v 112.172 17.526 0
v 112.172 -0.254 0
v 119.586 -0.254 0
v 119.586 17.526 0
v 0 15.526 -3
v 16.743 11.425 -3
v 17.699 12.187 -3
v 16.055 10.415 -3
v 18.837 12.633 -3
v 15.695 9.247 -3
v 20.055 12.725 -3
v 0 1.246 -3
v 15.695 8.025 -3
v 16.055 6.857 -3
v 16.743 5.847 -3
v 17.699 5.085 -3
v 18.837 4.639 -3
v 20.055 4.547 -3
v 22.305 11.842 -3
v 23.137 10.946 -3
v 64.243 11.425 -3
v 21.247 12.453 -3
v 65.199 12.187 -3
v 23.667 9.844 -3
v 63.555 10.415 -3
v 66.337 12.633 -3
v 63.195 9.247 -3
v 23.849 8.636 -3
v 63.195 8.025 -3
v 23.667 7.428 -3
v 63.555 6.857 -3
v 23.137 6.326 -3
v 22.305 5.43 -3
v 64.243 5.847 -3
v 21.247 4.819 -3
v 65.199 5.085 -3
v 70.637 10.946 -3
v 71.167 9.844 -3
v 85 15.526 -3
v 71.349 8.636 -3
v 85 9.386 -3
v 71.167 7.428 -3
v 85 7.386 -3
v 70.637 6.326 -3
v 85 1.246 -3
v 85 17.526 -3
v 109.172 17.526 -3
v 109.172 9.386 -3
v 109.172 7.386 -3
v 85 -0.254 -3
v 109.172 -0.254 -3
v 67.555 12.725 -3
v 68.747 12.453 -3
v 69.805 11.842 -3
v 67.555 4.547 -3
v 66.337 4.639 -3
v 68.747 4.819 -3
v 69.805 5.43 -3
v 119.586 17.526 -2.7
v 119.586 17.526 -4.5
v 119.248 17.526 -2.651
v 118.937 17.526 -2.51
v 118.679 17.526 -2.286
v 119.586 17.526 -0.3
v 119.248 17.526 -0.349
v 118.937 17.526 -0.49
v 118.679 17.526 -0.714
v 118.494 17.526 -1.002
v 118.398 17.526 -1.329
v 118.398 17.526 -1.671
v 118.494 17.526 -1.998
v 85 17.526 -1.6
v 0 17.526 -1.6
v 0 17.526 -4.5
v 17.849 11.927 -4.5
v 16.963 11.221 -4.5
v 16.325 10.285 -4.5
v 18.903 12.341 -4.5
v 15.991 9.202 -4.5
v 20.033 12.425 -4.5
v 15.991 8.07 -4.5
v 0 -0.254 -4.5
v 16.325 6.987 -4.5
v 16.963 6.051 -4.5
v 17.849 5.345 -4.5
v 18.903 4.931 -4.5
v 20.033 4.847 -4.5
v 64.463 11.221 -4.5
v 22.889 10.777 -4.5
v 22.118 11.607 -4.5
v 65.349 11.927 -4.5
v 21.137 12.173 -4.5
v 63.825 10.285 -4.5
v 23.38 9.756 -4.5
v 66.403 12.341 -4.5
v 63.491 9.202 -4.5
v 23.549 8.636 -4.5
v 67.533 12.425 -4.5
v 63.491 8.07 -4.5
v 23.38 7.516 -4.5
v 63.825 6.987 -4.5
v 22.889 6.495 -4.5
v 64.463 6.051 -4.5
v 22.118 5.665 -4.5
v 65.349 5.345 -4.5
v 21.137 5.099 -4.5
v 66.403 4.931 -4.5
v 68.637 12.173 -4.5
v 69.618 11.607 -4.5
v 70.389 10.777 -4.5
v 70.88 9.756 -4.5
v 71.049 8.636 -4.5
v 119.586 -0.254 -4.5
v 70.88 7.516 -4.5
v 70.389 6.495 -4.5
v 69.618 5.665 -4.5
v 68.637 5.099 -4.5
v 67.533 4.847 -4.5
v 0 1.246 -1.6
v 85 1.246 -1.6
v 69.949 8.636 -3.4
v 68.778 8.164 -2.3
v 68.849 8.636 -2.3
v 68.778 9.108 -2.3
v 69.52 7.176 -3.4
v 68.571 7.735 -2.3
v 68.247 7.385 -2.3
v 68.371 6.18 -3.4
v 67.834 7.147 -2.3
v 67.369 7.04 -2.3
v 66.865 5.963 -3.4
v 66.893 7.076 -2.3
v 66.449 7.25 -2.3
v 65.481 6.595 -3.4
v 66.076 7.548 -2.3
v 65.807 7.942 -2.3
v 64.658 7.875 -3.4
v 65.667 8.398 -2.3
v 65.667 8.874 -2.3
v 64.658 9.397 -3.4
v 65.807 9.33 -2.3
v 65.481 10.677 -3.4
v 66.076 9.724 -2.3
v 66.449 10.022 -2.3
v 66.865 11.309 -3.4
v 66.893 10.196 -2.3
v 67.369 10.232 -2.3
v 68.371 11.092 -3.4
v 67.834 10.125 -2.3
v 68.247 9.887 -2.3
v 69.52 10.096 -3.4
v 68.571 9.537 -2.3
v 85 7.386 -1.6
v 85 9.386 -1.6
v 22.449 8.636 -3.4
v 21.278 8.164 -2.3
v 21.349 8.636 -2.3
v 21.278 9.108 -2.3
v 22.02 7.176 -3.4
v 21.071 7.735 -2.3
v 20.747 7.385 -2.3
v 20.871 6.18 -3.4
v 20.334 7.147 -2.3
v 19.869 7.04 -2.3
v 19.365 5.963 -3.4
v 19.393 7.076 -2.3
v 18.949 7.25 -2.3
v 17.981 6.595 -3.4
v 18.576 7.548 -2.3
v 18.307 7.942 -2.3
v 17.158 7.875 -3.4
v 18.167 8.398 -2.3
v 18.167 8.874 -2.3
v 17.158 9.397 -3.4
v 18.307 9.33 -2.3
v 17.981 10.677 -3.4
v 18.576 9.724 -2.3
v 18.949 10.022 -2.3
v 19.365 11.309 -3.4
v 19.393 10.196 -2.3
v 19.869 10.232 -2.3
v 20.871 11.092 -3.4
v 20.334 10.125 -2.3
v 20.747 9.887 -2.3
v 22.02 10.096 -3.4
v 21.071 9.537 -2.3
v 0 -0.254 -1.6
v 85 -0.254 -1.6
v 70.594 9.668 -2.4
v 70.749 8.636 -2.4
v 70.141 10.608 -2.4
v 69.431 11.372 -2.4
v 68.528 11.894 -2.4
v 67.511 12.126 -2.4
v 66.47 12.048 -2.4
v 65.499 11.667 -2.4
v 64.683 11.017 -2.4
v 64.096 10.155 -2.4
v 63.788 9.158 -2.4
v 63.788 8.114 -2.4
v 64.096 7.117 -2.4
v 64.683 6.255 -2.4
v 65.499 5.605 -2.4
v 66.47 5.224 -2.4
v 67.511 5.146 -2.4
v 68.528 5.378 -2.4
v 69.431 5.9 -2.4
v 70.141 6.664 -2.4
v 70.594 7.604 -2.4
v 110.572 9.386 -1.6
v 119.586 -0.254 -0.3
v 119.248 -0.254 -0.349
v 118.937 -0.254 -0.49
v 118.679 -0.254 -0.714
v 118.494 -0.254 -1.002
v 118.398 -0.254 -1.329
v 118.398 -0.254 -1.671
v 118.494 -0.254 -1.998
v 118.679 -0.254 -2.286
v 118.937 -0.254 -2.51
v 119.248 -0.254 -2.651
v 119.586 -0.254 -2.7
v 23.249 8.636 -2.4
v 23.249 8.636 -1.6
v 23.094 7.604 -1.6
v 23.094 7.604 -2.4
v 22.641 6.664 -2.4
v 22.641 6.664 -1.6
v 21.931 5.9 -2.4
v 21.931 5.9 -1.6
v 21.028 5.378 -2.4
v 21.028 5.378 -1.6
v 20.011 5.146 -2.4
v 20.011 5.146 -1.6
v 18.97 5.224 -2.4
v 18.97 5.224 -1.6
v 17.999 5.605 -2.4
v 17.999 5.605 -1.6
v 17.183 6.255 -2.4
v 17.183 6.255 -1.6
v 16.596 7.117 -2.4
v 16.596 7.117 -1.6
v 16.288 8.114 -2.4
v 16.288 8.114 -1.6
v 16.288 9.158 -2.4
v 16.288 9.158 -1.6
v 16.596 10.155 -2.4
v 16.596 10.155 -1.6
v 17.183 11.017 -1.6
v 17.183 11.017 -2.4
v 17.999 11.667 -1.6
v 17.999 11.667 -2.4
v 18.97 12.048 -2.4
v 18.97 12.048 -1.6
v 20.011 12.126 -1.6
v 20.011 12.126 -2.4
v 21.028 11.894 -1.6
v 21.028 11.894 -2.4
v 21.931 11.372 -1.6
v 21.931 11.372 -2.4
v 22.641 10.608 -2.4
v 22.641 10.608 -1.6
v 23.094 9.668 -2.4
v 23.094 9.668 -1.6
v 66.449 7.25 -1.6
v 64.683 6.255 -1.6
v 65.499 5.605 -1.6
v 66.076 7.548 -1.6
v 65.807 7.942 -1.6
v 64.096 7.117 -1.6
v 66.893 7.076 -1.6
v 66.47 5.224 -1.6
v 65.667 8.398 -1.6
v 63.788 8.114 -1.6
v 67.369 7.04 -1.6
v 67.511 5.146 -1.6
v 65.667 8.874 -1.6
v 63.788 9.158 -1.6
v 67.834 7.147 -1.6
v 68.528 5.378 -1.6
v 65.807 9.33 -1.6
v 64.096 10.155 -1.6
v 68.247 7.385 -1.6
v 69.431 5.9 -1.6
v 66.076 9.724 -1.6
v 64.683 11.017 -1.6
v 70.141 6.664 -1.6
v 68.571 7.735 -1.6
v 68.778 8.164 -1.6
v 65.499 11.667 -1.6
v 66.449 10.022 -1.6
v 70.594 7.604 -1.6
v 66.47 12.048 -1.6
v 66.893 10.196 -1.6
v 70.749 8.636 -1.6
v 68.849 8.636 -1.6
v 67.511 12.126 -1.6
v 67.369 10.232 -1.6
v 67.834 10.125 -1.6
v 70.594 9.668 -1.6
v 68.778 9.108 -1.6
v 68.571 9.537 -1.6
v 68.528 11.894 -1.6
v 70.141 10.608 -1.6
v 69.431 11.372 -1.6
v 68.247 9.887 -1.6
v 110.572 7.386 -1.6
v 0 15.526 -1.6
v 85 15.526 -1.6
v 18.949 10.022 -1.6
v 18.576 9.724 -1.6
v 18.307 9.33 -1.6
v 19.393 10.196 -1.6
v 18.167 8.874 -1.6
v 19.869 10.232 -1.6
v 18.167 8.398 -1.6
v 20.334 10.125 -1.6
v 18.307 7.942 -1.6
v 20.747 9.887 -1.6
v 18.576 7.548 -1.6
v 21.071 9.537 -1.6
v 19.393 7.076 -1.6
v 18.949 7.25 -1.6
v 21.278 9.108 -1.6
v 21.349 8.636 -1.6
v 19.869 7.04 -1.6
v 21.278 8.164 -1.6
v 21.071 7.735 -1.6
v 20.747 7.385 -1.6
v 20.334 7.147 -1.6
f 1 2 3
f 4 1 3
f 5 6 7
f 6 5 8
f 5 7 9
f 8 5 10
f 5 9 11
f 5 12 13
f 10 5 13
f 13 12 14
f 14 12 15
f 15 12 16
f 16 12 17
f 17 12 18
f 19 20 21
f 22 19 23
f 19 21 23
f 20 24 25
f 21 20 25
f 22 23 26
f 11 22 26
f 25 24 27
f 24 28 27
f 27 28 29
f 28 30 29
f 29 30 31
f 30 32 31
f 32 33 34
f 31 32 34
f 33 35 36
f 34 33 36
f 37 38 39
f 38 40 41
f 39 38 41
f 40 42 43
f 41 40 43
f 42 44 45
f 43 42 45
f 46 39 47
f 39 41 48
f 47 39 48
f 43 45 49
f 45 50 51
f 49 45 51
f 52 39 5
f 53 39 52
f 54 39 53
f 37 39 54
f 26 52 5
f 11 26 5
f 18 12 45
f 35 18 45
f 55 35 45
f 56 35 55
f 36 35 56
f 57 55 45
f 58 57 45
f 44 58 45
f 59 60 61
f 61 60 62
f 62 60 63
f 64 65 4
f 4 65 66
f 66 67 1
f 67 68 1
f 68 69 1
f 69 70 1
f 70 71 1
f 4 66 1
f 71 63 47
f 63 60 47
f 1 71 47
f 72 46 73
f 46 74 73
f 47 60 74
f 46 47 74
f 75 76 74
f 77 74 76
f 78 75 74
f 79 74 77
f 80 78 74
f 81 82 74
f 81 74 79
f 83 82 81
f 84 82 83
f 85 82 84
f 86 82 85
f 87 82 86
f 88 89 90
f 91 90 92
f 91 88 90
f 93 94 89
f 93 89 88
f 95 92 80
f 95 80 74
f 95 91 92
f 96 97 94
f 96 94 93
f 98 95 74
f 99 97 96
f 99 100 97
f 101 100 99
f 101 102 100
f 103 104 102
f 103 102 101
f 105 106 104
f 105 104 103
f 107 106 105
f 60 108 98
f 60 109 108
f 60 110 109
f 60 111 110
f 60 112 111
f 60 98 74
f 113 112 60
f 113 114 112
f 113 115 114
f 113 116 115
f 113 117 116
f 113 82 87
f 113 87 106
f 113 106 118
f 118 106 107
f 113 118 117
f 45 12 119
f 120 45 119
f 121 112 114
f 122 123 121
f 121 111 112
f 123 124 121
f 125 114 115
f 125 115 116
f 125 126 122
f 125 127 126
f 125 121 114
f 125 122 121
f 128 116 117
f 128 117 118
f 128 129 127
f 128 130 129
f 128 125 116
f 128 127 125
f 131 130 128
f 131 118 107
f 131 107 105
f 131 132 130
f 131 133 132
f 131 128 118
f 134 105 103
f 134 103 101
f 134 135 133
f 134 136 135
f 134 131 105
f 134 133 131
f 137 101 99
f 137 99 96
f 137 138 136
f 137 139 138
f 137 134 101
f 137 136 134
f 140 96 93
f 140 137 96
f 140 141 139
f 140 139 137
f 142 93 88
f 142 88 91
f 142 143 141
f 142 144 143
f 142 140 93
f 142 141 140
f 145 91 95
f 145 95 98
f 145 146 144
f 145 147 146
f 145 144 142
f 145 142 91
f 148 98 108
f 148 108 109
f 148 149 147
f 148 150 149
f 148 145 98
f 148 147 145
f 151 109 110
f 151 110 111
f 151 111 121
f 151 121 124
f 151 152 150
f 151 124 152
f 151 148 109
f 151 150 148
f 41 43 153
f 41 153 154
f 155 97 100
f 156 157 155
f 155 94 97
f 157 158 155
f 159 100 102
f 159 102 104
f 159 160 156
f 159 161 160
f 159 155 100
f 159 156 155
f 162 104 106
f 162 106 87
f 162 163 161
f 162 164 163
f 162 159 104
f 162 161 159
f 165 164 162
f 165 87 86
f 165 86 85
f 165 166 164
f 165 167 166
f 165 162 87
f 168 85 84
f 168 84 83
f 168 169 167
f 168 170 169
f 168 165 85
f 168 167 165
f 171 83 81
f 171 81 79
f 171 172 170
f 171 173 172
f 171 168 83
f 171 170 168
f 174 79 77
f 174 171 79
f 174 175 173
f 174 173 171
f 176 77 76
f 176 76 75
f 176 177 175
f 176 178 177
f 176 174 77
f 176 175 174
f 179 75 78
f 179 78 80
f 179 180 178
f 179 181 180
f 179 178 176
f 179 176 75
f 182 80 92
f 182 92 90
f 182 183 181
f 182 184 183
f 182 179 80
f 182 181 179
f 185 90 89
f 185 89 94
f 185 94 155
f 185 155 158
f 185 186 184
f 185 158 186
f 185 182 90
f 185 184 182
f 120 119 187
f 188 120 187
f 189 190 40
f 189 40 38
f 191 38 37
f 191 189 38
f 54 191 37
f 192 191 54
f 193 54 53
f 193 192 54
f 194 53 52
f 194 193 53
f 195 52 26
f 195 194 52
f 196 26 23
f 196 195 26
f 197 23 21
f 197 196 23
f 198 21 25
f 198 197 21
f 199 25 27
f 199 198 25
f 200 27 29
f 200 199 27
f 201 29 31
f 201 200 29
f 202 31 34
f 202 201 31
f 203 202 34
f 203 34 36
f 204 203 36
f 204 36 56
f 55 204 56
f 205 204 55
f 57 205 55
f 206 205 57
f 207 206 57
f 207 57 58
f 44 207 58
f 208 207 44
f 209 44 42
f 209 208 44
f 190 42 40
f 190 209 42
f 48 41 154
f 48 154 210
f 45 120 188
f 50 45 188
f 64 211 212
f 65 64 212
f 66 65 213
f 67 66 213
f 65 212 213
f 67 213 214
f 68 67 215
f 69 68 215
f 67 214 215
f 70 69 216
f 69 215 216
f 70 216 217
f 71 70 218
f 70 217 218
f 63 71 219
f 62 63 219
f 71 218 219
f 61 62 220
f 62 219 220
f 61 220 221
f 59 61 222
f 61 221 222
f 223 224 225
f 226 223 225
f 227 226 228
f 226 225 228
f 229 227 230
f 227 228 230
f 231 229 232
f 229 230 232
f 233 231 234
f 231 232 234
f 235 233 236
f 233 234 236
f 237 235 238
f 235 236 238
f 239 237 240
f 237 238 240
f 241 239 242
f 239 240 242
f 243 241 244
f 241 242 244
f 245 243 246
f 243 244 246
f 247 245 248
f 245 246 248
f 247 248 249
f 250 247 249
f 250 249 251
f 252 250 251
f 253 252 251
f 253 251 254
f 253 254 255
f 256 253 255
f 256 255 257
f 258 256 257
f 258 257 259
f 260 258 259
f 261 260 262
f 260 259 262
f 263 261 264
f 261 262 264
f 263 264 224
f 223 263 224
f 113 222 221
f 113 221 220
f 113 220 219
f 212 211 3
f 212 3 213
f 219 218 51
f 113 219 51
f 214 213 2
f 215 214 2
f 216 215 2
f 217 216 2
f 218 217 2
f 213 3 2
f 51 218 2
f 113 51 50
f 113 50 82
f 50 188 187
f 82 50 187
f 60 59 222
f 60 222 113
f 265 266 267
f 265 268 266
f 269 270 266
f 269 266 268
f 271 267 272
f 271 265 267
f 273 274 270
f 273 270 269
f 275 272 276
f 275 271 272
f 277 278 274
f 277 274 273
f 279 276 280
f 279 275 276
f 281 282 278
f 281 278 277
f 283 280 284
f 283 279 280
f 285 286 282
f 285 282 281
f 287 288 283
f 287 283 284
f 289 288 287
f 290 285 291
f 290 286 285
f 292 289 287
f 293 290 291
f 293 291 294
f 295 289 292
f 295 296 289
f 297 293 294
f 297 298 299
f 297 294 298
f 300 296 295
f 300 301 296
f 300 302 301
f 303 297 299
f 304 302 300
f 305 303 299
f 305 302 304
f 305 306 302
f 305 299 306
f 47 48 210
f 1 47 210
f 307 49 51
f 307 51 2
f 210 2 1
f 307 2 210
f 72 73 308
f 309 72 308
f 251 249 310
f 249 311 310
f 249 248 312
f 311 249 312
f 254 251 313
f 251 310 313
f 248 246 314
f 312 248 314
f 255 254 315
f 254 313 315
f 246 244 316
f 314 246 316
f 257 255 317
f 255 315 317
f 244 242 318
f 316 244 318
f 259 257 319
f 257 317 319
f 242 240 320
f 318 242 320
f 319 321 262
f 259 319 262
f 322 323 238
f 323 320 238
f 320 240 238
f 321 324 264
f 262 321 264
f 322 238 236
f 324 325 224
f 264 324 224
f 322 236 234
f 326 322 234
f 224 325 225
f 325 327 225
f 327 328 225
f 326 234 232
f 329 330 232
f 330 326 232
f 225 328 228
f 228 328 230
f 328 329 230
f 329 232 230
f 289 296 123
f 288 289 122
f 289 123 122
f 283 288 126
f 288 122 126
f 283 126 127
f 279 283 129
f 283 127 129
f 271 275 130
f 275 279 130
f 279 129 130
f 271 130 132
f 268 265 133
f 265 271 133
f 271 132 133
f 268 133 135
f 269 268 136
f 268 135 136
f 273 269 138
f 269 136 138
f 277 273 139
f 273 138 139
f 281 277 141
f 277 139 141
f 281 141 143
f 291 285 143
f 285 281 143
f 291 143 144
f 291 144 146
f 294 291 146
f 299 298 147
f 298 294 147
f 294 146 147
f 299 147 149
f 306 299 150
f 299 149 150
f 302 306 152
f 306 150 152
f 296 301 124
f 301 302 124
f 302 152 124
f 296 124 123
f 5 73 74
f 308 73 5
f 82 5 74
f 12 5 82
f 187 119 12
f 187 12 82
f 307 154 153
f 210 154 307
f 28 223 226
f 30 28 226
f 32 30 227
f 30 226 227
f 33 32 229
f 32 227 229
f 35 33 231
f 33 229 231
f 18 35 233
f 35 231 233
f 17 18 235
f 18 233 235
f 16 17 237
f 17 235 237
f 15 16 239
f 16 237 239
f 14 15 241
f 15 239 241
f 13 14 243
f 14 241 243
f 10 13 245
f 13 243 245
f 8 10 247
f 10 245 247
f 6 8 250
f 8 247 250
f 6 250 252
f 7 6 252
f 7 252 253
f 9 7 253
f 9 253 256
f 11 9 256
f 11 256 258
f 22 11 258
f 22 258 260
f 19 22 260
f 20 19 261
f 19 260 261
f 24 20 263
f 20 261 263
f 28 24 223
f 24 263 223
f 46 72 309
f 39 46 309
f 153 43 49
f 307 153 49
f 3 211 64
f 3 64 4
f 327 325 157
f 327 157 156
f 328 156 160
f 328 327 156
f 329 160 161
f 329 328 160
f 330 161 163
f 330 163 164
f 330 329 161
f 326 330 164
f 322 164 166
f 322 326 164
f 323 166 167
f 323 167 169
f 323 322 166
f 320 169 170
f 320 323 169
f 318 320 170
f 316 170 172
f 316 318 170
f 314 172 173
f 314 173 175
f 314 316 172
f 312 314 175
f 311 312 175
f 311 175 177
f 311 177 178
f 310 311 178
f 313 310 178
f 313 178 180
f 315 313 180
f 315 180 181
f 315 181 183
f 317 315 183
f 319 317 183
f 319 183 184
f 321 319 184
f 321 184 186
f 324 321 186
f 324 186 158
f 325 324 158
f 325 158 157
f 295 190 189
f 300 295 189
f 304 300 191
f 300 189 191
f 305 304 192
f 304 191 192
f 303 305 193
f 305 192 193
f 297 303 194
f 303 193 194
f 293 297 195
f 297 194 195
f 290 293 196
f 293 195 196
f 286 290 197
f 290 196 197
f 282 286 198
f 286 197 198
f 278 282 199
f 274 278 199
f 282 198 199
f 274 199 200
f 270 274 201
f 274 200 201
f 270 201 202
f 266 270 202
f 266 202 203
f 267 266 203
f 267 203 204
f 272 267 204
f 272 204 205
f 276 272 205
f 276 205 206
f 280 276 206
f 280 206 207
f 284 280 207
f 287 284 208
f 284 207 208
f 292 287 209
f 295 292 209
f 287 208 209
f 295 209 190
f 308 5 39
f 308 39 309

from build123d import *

# Parameters (mm, degrees)
SKETCH_R        = 3.5
SKETCH_R_2      = 1.6
PAD_DEPTH       = 1.4
SKETCH001_W     = 119.586
SKETCH001_H     = 17.78
SKETCH001_R     = 1.6
PAD001_DEPTH    = 1.5
SKETCH002_R     = 3.5
SKETCH002_R_2   = 1.6
PAD002_DEPTH    = 1.4
SKETCH003_R     = 1.6
POCKET_DEPTH    = 2.901
PAD003_DEPTH    = 17.78
CHAMFER_SIZE    = 2.2
CHAMFER002_SIZE = 0.6
SKETCH014_W     = 2
SKETCH014_H     = 1.4
SKETCH014_W_2   = 1.5
PAD009_DEPTH    = 85
SKETCH016_W     = 27.172
SKETCH016_H     = 2
PAD010_DEPTH    = 1.4


with BuildPart() as part:
    # Sketch (on Face1 of CopyPcb_f5c5) → Pad (new body)
    with BuildSketch(Plane(origin=(-93.484762, 101.426, -1.6), x_dir=(1, 0, 0), z_dir=(0, 0, -1))):
        with Locations((113.233762, 92.79)):
            Circle(SKETCH_R)
        with Locations((113.233762, 92.79)):
            Circle(SKETCH_R_2, mode=Mode.SUBTRACT)
    extrude(amount=PAD_DEPTH)

    # Sketch001 (on Face4 of Pad) → Pad001 (join)
    with BuildSketch(Plane(origin=(-93.484762, 101.426, -3), x_dir=(1, 0, 0), z_dir=(0, 0, -1))):
        with Locations((153.277762, 92.79)):
            Rectangle(SKETCH001_W, SKETCH001_H)
        with Locations((113.233762, 92.79)):
            Circle(SKETCH001_R, mode=Mode.SUBTRACT)
    extrude(amount=PAD001_DEPTH)

    # Sketch002 (on Face3 of Pad001) → Pad002 (join)
    with BuildSketch(Plane(origin=(-93.484762, 101.426, -3), x_dir=(1, 0, 0), z_dir=(0, 0, 1))):
        with Locations((160.733762, -92.79)):
            Circle(SKETCH002_R)
        with Locations((160.733762, -92.79)):
            Circle(SKETCH002_R_2, mode=Mode.SUBTRACT)
    extrude(amount=PAD002_DEPTH)

    # Sketch003 (on Face11 of Pad002) → Pocket (cut, through all)
    with BuildSketch(Plane(origin=(-93.484762, 101.426, -4.5), x_dir=(1, 0, 0), z_dir=(0, 0, -1))):
        with Locations((160.733762, 92.79)):
            Circle(SKETCH003_R)
    extrude(amount=-POCKET_DEPTH, mode=Mode.SUBTRACT)

    # Sketch004 (on Face6 of Pocket) → Pad003 (join)
    with BuildSketch(Plane(origin=(-93.484762, -0.254, -1.6), x_dir=(1, 0, 0), z_dir=(0, -1, 0))):
        with BuildLine():
            Line((202.656762, -1.4), (205.656762, 1.6))
            Line((205.656762, 1.6), (213.070762, 1.6))
            Line((213.070762, 1.3), (213.070762, 1.6))
            ThreePointArc((213.070762, 1.3), (211.870762, 0.1), (213.070762, -1.1))
            Line((213.070762, -1.1), (213.070762, -1.4))
            Line((213.070762, -1.4), (202.656762, -1.4))
        make_face()
    extrude(amount=-PAD003_DEPTH)

    # Chamfer
    chamfer_edges = [part.edges().sort_by_distance(p)[0] for p in [
        (18.149, 8.636, -4.5),
        (65.649, 8.636, -4.5),
    ]]
    chamfer(chamfer_edges, length=CHAMFER_SIZE)

    # Chamfer002
    chamfer002_edges = [part.edges().sort_by_distance(p)[0] for p in [
        (16.249, 8.636, -3),
        (63.749, 8.636, -3),
    ]]
    chamfer(chamfer002_edges, length=CHAMFER002_SIZE)

    # Sketch014 (on Face7 of Chamfer002) → Pad009 (join)
    with BuildSketch(Plane(origin=(0, 101.426, -1.6), x_dir=(0, -1, 0), z_dir=(-1, 0, 0))):
        with Locations((84.9, -0.7)):
            Rectangle(SKETCH014_W, SKETCH014_H)
        with Locations((100.93, -0.7)):
            Rectangle(SKETCH014_W_2, SKETCH014_H)
    extrude(amount=-PAD009_DEPTH)

    # Sketch016 (on Face4 of Pad009) → Pad010 (join)
    with BuildSketch(Plane(origin=(-93.484762, 101.426, -3), x_dir=(1, 0, 0), z_dir=(0, 0, 1))):
        with Locations((192.070762, -93.04)):
            Rectangle(SKETCH016_W, SKETCH016_H)
    extrude(amount=PAD010_DEPTH)


solid = part.part
